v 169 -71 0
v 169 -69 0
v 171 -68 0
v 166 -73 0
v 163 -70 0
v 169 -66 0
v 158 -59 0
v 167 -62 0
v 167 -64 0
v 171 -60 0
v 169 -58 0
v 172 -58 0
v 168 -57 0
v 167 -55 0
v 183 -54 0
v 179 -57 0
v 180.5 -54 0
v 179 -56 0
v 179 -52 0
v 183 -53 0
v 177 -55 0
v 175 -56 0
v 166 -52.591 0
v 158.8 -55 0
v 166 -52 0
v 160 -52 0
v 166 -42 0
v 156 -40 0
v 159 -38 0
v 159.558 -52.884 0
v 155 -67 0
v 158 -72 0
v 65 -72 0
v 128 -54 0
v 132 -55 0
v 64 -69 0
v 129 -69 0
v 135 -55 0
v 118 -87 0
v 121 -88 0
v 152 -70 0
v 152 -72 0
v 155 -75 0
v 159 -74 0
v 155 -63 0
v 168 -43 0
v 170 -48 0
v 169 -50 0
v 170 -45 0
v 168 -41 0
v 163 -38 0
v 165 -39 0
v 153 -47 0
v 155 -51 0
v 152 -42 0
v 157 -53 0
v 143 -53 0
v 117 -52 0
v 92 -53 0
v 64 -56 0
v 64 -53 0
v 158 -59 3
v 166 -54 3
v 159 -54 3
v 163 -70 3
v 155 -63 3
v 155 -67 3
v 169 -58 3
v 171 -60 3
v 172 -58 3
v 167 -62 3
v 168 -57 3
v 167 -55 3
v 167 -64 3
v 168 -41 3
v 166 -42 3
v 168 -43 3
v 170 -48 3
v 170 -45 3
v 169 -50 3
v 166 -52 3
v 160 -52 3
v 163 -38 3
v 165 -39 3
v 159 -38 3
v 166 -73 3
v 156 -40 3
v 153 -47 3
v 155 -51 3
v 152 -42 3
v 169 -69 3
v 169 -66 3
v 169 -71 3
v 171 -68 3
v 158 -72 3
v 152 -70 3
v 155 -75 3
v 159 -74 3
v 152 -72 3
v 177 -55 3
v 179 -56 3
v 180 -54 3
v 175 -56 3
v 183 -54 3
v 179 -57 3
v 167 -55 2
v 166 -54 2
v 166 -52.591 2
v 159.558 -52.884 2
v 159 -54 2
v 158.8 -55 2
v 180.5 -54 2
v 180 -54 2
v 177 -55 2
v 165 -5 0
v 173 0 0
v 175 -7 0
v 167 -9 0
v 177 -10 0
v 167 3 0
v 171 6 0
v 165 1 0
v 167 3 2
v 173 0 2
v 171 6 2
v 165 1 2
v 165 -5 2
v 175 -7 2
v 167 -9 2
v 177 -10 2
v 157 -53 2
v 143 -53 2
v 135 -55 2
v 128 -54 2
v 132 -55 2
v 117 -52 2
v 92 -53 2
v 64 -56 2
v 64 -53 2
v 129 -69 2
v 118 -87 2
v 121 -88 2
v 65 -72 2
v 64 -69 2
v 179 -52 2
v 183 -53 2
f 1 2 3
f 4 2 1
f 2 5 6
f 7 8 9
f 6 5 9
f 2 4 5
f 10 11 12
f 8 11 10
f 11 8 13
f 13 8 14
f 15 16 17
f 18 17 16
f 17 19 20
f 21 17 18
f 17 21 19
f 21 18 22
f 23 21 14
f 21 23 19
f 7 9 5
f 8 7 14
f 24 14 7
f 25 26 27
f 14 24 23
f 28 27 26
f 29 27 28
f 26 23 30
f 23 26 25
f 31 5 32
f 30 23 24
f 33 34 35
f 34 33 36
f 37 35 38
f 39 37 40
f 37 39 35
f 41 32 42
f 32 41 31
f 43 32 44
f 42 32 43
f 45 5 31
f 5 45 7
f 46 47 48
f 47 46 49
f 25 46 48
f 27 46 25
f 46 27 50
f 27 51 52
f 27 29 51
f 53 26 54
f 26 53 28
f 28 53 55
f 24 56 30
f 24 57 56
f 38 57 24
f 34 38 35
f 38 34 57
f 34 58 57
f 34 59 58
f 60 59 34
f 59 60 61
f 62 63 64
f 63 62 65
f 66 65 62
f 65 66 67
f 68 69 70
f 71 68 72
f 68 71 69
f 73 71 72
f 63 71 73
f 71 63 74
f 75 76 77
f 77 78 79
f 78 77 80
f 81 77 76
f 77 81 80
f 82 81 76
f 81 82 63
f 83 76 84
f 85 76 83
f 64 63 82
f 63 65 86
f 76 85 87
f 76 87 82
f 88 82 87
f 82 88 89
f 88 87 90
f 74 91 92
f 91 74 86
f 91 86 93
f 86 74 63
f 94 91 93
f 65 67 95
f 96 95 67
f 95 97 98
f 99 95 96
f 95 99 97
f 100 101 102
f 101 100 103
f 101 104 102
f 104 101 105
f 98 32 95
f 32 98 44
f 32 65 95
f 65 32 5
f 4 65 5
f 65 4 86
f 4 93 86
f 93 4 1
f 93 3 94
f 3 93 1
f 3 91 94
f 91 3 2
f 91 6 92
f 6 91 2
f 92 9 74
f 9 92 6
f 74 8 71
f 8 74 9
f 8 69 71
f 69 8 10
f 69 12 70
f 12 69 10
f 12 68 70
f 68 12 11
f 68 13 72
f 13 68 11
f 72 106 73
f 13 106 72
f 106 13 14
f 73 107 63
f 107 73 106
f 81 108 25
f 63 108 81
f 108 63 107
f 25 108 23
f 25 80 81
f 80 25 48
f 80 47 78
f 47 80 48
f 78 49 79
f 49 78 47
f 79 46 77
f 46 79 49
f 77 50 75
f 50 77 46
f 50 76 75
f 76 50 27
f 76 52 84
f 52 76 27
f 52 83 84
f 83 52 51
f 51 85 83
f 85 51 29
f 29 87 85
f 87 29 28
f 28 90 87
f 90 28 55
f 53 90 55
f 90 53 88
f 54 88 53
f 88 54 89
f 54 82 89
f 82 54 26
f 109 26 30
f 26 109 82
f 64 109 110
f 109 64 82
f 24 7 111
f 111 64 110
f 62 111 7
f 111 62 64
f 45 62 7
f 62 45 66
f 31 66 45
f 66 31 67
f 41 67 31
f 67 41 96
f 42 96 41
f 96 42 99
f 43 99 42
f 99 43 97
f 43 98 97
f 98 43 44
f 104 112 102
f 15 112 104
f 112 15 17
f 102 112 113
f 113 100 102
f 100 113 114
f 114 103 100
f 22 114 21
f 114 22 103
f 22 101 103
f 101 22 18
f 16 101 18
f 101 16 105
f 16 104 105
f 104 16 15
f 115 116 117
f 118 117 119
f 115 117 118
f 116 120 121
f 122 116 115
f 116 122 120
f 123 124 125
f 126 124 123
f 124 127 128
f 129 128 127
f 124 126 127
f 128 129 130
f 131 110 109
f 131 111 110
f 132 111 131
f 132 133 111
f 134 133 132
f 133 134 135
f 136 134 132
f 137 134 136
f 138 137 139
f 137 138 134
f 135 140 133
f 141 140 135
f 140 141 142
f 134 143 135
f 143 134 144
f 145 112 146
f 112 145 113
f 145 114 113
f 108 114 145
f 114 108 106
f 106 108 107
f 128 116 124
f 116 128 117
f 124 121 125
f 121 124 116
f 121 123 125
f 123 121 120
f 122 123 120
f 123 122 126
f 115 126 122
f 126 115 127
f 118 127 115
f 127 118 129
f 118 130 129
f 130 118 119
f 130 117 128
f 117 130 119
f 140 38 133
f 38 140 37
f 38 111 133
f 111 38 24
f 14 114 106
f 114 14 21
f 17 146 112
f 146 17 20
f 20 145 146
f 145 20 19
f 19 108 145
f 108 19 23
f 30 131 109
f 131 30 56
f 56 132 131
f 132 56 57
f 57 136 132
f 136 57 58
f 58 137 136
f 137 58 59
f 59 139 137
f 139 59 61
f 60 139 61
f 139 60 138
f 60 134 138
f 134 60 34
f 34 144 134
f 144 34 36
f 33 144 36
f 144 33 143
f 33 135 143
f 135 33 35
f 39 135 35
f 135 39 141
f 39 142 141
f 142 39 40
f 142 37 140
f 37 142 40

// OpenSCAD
//start
module  child() 
{ 
color  ([1,0,0.6]) 
{ 
            polygon(points = [
[152.00,-42.00]
,[156.00,-40.00]
,[159.00,-38.00]
,[163.00,-38.00]
,[165.00,-39.00]
,[166.00,-42.00]
,[168.00,-41.00]
,[168.00,-43.00]
,[170.00,-45.00]
,[170.00,-48.00]
,[169.00,-50.00]
,[166.00,-52.00]
,[166.00,-54.00]
,[167.00,-55.00]
,[168.00,-57.00]
,[169.00,-58.00]
,[172.00,-58.00]
,[171.00,-60.00]
,[169.00,-61.00]
,[167.00,-62.00]
,[167.00,-64.00]
,[169.00,-66.00]
,[169.00,-69.00]
,[171.00,-68.00]
,[169.00,-71.00]
,[166.00,-73.00]
,[163.00,-70.00]
,[158.00,-72.00]
,[159.00,-74.00]
,[155.00,-75.00]
,[152.00,-72.00]
,[152.00,-70.00]
,[155.00,-67.00]
,[155.00,-63.00]
,[158.00,-59.00]
,[159.00,-54.00]
,[160.00,-52.00]
,[155.00,-51.00]
,[153.00,-47.00]
,[177.00,-55.00]
,[180.00,-54.00]
,[183.00,-54.00]
,[179.00,-57.00]
,[179.00,-56.00]
,[175.00,-56.00]
,[172.00,-58.00]
,[175.00,-56.00]
,[171.00,-60.00]
,[176.00,-58.00]
,[172.00,-58.00]
,[171.00,-58.00]
,[171.00,-58.00]
]
,paths = [
[0,1,2,3,4,5,6,7,8,9,10,11,12,13,14,15,16,17,18,19,20,21,22,23,24,25,26,27,28,29,30,31,32,33,34,35,36,37,38],[39,40,41,42,43,44,45,46],[47,48],[49,50,51]]
            );
}
}
//start
module  background() 
{ 
color  ([0.4,0.8,1]) 
{ 
            polygon(points = [
[64.00,-53.00]
,[77.00,-53.00]
,[92.00,-53.00]
,[117.00,-52.00]
,[143.00,-53.00]
,[157.00,-53.00]
,[179.00,-52.00]
,[183.00,-53.00]
,[178.00,-55.00]
,[169.00,-55.00]
,[135.00,-55.00]
,[129.00,-69.00]
,[121.00,-88.00]
,[118.00,-87.00]
,[132.00,-55.00]
,[65.00,-72.00]
,[64.00,-69.00]
,[128.00,-54.00]
,[64.00,-56.00]
,[167.00,3.00]
,[171.00,6.00]
,[173.00,0.00]
,[175.00,-7.00]
,[177.00,-10.00]
,[167.00,-9.00]
,[165.00,-5.00]
,[165.00,1.00]
]
,paths = [
[0,1,2,3,4,5,6,7,8,9,10,11,12,13,14,15,16,17,18],[19,20,21,22,23,24,25,26]]
            );
}
}

linear_extrude(height = 3){
translate([0, 0, 7]) child();
}
linear_extrude(height = 2){
background();
}
